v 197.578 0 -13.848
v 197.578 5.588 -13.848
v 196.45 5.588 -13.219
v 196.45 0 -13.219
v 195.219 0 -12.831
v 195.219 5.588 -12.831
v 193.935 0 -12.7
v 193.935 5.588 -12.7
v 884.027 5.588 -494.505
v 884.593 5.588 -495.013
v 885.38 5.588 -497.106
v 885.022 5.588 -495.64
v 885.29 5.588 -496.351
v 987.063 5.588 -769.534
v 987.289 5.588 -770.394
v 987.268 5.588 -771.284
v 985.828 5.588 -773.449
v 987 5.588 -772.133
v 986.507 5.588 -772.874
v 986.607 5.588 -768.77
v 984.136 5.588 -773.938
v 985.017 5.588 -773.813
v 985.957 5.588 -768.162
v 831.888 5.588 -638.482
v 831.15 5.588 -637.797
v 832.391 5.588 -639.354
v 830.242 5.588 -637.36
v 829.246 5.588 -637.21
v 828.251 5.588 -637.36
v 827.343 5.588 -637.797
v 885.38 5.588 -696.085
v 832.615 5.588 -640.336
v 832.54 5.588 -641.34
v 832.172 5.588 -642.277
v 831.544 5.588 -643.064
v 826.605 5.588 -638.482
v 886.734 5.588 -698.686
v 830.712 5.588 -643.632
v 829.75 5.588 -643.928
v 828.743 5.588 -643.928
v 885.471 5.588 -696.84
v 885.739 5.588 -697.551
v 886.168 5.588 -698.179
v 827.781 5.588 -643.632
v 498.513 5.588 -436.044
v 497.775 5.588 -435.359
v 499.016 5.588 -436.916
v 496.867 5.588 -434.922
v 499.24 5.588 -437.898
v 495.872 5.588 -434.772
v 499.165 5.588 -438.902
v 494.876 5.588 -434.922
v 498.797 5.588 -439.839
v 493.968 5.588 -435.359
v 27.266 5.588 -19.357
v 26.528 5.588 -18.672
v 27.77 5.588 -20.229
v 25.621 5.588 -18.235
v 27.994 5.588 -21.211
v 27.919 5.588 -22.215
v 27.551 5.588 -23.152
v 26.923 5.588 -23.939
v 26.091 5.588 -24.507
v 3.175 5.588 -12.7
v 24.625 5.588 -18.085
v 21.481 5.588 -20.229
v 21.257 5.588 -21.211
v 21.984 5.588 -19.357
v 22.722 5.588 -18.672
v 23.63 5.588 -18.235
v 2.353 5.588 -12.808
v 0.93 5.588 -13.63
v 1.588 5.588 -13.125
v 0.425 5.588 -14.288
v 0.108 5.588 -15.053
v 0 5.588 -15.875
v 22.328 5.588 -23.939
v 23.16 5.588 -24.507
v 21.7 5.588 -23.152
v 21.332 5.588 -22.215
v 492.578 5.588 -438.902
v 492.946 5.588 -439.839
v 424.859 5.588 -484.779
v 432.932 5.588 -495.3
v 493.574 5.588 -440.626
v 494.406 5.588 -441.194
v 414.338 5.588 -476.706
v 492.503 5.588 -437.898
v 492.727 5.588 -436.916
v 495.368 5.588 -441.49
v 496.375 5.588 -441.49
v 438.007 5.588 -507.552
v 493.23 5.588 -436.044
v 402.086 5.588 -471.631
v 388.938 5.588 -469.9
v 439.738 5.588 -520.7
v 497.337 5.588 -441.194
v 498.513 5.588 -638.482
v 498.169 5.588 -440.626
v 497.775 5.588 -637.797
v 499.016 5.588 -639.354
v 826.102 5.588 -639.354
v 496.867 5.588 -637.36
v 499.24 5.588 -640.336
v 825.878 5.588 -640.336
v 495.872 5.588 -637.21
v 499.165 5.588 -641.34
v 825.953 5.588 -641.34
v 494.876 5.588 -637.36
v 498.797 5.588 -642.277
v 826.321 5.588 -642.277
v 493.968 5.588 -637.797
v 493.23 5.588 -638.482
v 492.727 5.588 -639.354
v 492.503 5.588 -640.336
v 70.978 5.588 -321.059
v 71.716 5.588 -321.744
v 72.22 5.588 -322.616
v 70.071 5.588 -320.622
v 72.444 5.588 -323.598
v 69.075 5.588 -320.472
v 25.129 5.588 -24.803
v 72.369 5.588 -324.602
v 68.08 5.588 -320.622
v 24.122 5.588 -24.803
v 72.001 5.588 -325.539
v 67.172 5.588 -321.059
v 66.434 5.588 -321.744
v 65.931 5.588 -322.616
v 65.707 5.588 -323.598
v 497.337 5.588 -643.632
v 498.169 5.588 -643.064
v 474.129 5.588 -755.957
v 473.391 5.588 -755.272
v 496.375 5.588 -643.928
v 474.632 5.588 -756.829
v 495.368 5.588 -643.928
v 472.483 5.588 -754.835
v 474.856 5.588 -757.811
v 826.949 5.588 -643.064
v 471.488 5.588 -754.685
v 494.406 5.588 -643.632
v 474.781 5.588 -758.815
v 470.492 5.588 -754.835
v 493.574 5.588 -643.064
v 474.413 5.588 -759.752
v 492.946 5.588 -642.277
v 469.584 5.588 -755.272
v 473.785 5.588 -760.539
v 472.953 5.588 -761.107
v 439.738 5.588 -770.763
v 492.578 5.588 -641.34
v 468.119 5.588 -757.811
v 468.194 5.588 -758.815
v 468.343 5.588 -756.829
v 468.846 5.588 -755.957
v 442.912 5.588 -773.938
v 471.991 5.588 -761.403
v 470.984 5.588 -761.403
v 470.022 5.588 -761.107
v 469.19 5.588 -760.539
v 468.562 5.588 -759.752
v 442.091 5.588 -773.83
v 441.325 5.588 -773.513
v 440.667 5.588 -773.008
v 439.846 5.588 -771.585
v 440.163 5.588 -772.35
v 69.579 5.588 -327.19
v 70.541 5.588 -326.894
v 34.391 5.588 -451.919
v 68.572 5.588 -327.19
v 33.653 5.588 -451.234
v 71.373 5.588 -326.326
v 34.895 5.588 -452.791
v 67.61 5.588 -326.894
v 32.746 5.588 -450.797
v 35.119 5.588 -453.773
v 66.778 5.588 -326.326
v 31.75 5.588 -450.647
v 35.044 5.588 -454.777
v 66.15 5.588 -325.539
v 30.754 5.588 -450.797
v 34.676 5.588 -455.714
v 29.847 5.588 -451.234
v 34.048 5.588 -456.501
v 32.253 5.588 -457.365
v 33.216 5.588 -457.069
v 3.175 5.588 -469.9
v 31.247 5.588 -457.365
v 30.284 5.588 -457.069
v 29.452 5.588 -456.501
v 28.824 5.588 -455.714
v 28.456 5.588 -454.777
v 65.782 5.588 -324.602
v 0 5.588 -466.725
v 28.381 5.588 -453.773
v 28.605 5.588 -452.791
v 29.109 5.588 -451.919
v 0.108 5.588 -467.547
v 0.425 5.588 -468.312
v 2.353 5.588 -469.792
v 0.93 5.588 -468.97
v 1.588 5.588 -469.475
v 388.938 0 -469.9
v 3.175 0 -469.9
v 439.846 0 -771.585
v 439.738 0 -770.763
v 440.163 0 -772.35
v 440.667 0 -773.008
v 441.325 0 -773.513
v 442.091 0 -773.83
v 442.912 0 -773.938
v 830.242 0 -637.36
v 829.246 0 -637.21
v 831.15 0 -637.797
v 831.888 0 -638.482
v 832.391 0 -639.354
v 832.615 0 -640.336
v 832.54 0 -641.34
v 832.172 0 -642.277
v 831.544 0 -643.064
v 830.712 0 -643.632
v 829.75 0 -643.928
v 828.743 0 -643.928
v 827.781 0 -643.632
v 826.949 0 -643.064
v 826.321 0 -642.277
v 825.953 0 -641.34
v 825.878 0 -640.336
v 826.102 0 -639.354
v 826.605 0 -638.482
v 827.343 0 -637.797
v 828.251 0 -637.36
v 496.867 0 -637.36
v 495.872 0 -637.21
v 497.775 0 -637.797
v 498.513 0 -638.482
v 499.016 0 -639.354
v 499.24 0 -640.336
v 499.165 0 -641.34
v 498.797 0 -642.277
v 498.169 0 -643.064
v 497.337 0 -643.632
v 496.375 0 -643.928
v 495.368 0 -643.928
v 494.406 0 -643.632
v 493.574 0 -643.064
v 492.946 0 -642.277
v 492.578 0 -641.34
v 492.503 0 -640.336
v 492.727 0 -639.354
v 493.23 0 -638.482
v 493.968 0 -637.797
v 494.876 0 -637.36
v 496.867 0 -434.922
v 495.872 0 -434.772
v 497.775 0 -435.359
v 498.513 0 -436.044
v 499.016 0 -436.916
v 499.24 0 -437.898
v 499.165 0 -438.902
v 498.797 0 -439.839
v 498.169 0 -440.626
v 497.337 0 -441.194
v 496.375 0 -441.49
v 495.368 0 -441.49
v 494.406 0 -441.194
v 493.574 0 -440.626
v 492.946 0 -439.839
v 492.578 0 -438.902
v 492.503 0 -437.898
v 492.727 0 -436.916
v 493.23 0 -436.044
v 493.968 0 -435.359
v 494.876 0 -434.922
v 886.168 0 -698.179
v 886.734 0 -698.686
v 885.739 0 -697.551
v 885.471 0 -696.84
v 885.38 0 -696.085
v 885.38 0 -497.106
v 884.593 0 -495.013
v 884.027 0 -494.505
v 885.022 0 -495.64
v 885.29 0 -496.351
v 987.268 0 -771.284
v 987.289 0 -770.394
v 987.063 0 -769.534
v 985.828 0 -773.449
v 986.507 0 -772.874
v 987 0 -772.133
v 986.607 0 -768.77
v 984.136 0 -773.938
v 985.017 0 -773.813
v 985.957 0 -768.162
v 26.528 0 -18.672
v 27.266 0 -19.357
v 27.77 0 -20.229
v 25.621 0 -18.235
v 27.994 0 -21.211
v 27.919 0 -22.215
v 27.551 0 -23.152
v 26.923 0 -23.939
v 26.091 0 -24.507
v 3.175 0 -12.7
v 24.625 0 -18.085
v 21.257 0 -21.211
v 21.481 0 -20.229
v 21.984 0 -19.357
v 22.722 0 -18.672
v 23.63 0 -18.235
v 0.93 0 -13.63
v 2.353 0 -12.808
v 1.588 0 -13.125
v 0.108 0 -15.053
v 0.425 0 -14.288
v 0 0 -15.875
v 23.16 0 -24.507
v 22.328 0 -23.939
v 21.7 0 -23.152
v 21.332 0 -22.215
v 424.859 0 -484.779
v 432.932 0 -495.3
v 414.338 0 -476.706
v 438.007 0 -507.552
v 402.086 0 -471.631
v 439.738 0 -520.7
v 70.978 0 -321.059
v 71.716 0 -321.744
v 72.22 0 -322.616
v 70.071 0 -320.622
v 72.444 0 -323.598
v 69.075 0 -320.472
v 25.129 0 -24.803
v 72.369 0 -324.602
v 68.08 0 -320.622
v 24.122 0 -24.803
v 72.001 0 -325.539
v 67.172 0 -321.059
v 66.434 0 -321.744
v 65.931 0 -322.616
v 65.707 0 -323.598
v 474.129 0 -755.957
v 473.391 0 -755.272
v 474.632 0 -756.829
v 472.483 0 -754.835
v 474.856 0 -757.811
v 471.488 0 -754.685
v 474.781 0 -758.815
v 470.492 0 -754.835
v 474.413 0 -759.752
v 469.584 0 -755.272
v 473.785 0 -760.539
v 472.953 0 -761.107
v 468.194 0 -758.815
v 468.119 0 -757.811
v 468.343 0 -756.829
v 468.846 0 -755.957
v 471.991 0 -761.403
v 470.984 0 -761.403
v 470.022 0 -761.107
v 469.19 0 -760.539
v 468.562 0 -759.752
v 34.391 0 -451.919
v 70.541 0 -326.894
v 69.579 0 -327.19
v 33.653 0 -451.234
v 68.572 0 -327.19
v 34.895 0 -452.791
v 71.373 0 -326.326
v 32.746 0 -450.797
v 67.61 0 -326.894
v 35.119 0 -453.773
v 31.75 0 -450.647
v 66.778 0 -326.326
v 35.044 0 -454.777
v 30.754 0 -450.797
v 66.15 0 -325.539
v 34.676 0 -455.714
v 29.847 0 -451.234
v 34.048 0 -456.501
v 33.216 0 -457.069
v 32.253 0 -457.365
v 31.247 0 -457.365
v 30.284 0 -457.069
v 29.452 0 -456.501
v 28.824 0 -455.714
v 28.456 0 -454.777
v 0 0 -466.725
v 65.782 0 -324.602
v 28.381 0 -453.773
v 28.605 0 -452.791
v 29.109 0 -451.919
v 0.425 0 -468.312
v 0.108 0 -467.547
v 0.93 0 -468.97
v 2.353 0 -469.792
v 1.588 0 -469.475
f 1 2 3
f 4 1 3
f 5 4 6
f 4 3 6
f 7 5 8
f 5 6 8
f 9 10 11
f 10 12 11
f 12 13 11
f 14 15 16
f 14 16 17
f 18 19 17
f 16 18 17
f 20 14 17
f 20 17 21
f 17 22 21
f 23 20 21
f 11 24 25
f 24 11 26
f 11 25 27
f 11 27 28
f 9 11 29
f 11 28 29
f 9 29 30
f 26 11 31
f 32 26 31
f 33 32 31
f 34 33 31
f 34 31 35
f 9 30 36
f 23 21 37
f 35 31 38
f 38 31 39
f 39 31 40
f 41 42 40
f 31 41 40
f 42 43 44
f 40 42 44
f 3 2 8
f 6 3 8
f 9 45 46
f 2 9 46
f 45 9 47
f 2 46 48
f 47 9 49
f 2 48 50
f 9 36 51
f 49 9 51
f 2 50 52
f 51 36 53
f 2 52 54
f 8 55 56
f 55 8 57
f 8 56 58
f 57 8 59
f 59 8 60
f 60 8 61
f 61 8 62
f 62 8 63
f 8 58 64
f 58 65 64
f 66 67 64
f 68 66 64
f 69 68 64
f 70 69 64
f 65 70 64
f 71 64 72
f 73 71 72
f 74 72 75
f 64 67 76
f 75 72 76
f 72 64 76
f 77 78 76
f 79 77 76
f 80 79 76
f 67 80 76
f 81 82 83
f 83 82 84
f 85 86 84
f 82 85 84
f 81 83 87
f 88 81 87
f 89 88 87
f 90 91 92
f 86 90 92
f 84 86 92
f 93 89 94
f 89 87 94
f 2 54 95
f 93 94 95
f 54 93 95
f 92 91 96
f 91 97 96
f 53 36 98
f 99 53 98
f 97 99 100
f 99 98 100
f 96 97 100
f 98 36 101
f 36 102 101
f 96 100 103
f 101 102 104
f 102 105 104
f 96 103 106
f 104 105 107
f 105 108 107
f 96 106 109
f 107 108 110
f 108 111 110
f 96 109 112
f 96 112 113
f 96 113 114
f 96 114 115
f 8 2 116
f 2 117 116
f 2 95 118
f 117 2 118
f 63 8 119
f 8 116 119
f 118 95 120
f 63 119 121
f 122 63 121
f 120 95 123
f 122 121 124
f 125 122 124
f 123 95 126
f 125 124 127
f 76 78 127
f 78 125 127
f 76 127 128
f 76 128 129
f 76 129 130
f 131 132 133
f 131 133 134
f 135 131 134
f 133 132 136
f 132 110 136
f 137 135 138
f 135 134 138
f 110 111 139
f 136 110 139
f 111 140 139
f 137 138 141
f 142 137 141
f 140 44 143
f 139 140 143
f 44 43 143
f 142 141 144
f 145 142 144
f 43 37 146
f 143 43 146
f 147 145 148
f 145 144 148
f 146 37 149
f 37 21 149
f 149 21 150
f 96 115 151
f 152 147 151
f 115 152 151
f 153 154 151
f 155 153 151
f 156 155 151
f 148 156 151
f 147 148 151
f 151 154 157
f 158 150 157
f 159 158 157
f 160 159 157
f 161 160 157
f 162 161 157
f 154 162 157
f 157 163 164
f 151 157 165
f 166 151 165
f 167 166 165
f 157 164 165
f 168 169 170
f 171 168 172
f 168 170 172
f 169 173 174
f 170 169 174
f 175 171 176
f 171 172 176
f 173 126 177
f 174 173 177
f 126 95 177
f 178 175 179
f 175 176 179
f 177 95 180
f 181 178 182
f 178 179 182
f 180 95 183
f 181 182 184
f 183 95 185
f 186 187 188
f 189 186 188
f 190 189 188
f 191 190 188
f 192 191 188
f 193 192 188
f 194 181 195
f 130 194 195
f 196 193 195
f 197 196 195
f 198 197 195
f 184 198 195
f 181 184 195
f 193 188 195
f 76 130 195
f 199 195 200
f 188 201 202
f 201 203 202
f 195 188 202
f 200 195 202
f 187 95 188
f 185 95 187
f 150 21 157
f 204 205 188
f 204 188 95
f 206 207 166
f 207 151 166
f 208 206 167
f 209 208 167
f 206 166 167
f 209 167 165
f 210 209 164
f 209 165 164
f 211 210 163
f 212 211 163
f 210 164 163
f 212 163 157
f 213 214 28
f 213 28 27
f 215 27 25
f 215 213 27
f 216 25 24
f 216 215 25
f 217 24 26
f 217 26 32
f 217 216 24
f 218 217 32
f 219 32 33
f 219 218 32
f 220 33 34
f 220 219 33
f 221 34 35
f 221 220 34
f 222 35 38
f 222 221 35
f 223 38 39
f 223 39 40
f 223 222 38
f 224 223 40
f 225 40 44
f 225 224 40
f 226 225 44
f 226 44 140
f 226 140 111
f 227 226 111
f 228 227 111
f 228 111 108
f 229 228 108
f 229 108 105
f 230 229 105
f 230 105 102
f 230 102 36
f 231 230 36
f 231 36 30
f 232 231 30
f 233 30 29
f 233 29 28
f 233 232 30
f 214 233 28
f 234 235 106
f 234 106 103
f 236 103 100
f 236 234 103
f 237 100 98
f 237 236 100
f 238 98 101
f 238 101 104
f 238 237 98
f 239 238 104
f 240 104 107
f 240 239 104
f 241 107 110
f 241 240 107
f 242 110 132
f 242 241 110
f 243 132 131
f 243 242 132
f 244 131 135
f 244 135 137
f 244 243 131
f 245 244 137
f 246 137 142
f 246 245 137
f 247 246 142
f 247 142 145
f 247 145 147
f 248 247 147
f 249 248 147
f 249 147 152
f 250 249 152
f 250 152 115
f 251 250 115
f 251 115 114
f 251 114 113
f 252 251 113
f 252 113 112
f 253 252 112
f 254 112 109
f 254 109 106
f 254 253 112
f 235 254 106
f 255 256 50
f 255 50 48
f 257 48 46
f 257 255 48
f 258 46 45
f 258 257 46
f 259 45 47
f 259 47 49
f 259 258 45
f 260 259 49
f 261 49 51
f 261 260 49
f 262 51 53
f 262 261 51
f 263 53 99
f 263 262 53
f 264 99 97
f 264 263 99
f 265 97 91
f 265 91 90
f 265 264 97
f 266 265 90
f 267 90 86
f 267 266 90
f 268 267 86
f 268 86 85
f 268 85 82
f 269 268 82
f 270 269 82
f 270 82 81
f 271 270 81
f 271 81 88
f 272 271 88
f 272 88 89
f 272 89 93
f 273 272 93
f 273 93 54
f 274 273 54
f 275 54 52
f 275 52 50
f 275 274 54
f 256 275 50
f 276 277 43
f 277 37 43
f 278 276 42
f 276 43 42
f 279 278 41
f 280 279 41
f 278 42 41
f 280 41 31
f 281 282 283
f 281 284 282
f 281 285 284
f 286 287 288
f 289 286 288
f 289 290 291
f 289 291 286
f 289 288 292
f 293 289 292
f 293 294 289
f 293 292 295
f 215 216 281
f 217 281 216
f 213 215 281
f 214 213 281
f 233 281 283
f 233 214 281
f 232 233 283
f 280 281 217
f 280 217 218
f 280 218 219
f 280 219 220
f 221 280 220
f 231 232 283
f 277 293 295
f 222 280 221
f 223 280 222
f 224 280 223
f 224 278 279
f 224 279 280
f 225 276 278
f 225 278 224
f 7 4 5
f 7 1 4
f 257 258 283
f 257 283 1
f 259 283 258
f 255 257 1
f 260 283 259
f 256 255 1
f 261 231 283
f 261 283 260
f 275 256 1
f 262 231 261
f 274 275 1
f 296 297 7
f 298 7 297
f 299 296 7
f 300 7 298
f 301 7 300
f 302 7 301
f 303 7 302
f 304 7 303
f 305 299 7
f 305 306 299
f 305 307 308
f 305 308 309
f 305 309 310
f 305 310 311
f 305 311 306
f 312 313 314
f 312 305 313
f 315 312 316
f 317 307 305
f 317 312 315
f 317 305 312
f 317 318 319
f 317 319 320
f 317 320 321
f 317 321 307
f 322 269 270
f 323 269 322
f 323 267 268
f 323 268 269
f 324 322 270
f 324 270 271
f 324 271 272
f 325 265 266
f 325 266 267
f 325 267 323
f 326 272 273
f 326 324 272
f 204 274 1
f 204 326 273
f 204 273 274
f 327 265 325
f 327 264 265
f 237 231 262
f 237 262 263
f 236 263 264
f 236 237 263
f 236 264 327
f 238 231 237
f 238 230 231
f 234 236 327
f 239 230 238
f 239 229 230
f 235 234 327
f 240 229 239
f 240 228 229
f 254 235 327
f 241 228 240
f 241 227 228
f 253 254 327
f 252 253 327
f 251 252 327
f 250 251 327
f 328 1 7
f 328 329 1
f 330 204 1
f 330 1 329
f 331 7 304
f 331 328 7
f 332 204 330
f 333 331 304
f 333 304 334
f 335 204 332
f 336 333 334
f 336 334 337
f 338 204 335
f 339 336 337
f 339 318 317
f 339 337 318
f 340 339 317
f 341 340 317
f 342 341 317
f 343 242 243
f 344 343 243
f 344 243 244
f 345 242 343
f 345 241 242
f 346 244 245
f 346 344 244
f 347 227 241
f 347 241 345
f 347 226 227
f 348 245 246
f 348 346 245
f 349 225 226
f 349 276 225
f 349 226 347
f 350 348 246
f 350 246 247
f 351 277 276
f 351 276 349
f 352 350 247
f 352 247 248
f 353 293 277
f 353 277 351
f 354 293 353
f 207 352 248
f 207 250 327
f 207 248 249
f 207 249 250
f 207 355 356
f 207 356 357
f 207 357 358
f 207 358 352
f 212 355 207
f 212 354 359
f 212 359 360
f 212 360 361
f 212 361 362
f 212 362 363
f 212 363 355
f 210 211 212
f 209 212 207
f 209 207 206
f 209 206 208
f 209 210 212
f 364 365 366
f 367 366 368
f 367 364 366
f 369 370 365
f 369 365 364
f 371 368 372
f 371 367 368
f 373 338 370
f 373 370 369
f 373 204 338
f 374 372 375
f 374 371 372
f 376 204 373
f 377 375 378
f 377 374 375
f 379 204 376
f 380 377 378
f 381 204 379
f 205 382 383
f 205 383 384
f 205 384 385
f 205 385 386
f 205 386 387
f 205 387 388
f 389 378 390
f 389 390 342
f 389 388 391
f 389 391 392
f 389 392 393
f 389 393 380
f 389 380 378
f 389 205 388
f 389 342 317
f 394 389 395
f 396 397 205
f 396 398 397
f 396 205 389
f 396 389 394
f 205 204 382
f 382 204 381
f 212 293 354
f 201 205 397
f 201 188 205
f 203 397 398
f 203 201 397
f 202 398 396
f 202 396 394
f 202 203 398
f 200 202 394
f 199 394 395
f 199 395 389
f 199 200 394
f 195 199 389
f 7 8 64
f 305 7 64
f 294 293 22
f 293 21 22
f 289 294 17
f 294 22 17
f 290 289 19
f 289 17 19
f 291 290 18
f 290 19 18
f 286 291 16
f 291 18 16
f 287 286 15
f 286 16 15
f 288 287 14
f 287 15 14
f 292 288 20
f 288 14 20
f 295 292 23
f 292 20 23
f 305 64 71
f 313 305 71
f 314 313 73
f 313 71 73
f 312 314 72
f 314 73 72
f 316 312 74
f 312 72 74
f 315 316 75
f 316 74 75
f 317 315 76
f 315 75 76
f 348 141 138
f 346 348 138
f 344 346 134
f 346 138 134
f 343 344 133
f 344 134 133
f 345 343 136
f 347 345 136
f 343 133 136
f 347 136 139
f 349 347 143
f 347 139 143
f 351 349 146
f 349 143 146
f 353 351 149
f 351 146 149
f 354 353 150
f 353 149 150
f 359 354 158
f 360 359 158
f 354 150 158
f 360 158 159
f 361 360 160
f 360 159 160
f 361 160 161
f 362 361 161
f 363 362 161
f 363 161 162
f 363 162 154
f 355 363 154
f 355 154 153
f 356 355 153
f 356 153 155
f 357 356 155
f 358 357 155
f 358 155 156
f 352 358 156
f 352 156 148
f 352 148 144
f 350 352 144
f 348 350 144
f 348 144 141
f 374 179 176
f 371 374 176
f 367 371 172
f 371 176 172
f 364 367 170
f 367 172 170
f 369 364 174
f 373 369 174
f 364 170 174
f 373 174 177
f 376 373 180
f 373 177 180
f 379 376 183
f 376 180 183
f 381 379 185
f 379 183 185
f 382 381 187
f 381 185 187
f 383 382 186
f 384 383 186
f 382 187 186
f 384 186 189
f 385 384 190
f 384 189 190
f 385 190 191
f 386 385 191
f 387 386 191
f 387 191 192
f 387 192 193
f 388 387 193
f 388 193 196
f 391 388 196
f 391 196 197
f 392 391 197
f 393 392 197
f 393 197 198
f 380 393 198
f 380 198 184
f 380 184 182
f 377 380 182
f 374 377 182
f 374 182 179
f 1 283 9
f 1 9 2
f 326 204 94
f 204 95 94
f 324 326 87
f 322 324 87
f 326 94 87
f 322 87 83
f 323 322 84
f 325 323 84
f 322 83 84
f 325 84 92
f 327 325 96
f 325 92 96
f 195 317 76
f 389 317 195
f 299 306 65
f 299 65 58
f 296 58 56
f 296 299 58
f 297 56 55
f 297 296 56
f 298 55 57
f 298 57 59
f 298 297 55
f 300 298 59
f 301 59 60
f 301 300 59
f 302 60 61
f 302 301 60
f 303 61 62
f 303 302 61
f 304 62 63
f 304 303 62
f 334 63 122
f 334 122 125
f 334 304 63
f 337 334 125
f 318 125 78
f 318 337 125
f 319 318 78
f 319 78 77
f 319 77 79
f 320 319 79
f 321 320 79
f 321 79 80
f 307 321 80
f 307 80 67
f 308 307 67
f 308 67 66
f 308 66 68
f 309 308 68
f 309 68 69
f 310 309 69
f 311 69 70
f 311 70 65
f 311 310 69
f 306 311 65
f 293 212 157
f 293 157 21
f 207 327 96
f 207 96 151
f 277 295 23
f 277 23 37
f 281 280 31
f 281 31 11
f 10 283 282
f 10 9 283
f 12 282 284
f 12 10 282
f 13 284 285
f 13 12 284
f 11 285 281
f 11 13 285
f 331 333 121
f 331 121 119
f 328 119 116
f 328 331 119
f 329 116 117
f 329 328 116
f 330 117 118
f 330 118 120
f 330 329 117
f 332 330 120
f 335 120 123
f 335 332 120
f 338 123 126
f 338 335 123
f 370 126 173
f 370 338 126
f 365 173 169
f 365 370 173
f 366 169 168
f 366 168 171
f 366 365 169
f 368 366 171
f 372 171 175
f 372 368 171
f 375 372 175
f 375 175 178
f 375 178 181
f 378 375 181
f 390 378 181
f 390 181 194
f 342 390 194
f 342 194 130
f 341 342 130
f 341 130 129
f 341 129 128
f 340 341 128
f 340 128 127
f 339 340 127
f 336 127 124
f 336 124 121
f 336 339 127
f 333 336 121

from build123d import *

# Parameters (mm, degrees)
SKETCH1_R           = 3.3782
BOSS_EXTRUDE1_DEPTH = 5.588
FILLET1_R           = 50.8
SKETCH2_R           = 3.3782
CUT_EXTRUDE1_DEPTH  = 1260.942692133
FILLET2_R           = 3.175
CUT_EXTRUDE2_DEPTH  = 1255.509228579


with BuildPart() as part:
    # Sketch1 (on Top Plane) → Boss-Extrude1 (new body)
    with BuildSketch(Plane(origin=(0, 0, 0), x_dir=(1, 0, 0), z_dir=(0, 1, 0))):
        Polygon((0, 0), (0, 469.9), (439.7375, 469.9), (439.7375, 773.938), (994.205378114, 773.938), (885.3805, 697.738), (885.3805, 495.45319999), (177.8, 0), align=None)
        with Locations(Location((24.6253, 21.463, 0), (0, 0, 270))):
            Circle(SKETCH1_R, mode=Mode.SUBTRACT)
        with Locations(Location((69.0753, 323.85, 0), (0, 0, 270))):
            Circle(SKETCH1_R, mode=Mode.SUBTRACT)
        with Locations(Location((495.8715, 438.15, 0), (0, 0, 270))):
            Circle(SKETCH1_R, mode=Mode.SUBTRACT)
        with Locations(Location((495.8715, 640.588, 0), (0, 0, 270))):
            Circle(SKETCH1_R, mode=Mode.SUBTRACT)
        with Locations(Location((829.2465, 640.588, 0), (0, 0, 270))):
            Circle(SKETCH1_R, mode=Mode.SUBTRACT)
    extrude(amount=BOSS_EXTRUDE1_DEPTH)

    # Fillet1
    fillet1_edges = [part.edges().sort_by_distance(p)[0] for p in [
        (439.7375, 2.794, -469.9),
    ]]
    fillet(fillet1_edges, radius=FILLET1_R)

    # Sketch2 → Cut-Extrude1 (cut, through all)
    with BuildSketch(Plane(origin=(0, 5.588, 0), x_dir=(1, 0, 0), z_dir=(0, 1, 0))):
        with Locations(Location((31.75, 454.025, 0), (0, 0, 270))):
            Circle(SKETCH2_R)
        with Locations(Location((471.4875, 758.063, 0), (0, 0, 270))):
            Circle(SKETCH2_R)
    extrude(amount=-CUT_EXTRUDE1_DEPTH, mode=Mode.SUBTRACT)

    # Fillet2
    fillet2_edges = [part.edges().sort_by_distance(p)[0] for p in [
        (0, 2.794, 0),
        (0, 2.794, -469.9),
        (439.7375, 2.794, -773.938),
        (994.205378114, 2.794, -773.938),
        (885.3805, 2.794, -697.738),
        (885.3805, 2.794, -495.45319999),
        (177.8, 2.794, 0),
    ]]
    fillet(fillet2_edges, radius=FILLET2_R)

    # Sketch3 → Cut-Extrude2 (cut, through all)
    with BuildSketch(Plane(origin=(0, 5.588, 0), x_dir=(1, 0, 0), z_dir=(0, 1, 0))):
        with BuildLine():
            Line((3.175, 0), (176.798926345, 0))
            ThreePointArc((176.798926345, 0), (177.753667259, 0.146948681), (178.620031531, 0.574192259))
            Line((178.620031531, 0.574192259), (197.577542747, 13.848384519))
            ThreePointArc((197.577542747, 13.848384519), (195.844814203, 12.993897363), (193.935332376, 12.7))
            Line((193.935332376, 12.7), (3.175, 12.7))
            ThreePointArc((3.175, 12.7), (0.92993597, 13.62993597), (0, 15.875))
            Line((0, 15.875), (0, 3.175))
            ThreePointArc((0, 3.175), (0.92993597, 0.92993597), (3.175, 0))
        make_face()
    extrude(amount=-CUT_EXTRUDE2_DEPTH, mode=Mode.SUBTRACT)


solid = part.part
